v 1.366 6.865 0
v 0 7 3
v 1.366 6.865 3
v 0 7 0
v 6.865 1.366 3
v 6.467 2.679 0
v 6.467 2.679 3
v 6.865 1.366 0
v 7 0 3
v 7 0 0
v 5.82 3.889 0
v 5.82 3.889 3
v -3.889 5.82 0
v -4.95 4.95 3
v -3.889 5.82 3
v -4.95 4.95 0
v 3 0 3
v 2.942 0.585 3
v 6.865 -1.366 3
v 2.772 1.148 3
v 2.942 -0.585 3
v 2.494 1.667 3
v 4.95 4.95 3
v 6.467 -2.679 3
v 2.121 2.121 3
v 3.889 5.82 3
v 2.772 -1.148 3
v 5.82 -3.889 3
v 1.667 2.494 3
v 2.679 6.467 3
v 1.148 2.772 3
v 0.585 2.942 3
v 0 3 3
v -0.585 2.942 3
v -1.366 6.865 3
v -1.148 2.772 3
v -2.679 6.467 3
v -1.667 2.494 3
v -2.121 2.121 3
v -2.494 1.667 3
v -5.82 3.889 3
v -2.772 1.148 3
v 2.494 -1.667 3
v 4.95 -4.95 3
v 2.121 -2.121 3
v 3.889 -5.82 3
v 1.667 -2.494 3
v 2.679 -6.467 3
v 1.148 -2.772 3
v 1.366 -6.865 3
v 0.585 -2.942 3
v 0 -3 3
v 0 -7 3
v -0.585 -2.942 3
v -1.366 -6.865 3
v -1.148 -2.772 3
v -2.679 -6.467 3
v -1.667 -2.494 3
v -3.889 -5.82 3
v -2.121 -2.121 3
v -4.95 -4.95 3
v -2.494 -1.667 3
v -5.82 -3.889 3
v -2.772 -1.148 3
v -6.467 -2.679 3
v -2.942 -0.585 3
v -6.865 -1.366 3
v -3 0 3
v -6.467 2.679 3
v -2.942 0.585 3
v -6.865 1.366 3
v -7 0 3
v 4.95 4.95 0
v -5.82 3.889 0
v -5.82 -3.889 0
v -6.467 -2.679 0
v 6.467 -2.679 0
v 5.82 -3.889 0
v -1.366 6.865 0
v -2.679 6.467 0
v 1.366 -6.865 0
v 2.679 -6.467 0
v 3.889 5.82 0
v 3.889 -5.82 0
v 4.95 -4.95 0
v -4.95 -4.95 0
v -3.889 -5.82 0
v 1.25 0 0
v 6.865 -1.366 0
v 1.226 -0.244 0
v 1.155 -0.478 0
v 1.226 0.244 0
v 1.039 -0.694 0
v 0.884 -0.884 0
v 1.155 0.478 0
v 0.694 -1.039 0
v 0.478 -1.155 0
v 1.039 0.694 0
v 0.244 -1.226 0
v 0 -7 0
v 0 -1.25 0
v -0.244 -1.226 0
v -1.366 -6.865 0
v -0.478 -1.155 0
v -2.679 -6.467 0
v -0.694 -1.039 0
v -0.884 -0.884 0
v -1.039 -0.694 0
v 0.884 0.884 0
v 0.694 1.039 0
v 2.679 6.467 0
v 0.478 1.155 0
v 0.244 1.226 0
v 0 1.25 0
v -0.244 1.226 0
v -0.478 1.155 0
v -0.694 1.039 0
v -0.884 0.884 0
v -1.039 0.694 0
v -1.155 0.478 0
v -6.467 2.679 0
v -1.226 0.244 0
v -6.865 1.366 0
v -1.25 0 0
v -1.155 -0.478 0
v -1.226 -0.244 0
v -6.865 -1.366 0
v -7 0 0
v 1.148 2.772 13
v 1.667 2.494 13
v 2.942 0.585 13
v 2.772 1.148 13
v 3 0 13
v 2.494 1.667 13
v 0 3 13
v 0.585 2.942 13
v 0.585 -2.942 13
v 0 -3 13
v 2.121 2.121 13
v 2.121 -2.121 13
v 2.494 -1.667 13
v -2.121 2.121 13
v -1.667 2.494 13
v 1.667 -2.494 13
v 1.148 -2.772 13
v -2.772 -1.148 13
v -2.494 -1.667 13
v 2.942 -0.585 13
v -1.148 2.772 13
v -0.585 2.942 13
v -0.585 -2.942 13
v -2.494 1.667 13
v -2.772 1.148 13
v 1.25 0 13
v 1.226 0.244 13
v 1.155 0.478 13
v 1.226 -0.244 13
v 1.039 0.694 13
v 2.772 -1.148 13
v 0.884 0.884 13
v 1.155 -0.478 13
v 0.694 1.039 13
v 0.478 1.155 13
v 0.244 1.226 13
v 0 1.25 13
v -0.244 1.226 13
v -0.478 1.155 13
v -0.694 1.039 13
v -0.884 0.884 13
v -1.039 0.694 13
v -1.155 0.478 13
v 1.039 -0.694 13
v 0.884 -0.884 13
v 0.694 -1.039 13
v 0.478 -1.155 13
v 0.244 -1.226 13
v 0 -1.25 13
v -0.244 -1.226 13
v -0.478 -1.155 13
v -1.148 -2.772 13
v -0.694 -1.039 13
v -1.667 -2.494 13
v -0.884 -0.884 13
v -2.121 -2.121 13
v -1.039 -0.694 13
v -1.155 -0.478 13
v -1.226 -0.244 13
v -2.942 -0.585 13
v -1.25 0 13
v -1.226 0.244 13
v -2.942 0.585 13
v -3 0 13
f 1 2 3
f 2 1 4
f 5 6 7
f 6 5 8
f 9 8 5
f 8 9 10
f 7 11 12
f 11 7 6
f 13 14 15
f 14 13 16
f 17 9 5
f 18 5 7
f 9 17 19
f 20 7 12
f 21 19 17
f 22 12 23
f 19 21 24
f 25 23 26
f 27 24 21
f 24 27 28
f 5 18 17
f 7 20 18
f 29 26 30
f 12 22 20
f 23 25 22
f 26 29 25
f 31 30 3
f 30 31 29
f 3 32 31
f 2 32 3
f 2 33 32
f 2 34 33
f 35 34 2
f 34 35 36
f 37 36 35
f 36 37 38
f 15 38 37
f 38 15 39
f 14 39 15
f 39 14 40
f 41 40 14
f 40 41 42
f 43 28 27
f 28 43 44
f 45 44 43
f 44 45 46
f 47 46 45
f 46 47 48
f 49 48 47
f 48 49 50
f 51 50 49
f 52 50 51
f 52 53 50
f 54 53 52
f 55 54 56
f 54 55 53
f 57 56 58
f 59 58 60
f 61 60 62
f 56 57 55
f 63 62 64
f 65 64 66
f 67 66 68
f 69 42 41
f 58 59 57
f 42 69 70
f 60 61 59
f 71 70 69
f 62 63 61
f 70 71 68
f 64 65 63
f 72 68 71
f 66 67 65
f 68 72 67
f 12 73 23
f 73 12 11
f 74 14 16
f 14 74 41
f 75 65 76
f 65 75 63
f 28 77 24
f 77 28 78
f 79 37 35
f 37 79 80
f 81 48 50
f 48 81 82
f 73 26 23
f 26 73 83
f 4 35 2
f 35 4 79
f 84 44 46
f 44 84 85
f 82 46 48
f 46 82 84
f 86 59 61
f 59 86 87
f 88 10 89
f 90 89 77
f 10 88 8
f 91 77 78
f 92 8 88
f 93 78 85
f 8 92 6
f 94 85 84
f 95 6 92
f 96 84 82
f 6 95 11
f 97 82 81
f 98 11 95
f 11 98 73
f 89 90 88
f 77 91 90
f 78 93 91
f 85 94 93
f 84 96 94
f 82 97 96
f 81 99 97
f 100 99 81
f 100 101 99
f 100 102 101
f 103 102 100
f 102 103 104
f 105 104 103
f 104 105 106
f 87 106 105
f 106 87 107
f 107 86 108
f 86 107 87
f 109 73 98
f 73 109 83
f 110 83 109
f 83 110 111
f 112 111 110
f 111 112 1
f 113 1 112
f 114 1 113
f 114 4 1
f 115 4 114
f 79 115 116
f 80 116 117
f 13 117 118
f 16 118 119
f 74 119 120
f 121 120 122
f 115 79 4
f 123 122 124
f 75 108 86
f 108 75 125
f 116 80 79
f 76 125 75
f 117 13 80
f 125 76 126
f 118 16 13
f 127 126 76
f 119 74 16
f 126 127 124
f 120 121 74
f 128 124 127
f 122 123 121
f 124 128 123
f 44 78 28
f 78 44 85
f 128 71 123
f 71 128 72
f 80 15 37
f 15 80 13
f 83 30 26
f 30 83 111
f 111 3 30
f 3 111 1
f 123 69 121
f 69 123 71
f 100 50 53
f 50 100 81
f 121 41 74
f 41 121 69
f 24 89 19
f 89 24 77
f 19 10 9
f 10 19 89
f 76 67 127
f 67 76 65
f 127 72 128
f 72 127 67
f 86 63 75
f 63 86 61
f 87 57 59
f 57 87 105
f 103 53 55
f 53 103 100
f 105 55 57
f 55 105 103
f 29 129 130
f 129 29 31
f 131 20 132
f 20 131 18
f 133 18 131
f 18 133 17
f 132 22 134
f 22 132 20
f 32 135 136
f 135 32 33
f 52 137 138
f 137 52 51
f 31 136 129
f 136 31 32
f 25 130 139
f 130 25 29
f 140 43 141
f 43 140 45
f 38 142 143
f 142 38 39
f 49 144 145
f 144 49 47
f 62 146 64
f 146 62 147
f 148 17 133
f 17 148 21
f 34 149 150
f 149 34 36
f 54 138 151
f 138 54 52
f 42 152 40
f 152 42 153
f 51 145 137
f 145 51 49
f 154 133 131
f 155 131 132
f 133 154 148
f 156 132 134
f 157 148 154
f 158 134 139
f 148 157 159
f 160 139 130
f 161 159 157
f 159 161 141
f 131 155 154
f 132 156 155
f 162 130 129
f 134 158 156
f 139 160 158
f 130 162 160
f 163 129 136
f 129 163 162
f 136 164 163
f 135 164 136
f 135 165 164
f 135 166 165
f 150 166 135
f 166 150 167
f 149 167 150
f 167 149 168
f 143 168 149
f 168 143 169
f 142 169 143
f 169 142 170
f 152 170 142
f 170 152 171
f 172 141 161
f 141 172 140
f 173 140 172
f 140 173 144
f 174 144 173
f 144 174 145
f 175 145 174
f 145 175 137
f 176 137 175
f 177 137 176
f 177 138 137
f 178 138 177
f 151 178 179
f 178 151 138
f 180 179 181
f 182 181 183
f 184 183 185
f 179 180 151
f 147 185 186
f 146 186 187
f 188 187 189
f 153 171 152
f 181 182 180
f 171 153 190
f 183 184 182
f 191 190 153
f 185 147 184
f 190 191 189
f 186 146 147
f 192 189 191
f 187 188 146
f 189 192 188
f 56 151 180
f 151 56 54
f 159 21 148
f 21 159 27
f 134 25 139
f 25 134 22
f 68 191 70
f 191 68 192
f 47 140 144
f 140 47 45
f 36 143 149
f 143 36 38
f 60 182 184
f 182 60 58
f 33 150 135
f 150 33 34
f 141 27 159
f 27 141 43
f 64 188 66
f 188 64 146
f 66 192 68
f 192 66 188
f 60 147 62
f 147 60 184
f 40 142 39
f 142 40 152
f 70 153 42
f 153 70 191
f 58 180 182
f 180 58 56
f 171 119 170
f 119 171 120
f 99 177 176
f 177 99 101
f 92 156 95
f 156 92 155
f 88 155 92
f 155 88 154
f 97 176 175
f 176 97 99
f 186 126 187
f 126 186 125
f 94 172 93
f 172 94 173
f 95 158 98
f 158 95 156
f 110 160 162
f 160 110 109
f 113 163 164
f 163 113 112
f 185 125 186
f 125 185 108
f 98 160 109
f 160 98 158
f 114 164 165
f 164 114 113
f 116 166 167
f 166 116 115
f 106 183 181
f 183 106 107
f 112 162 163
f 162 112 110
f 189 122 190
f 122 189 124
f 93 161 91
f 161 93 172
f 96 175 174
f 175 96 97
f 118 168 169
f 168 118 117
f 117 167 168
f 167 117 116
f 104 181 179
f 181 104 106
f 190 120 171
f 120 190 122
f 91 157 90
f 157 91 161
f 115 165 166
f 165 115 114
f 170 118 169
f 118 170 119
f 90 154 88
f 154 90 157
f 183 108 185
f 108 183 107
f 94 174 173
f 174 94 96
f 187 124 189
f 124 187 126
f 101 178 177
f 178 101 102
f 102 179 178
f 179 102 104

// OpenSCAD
$fn = 32;

// ----------------------------------------------------------------------
// Micro post: flanged post, 5-20 mm class
// ----------------------------------------------------------------------

// --- parameters (mm) ---
post_d = 6;               // post diameter
post_h = 10;              // post height above the flange
flange_d = 14;            // flange diameter
flange_t = 3;             // flange thickness
bore_d = 2.5;             // through bore

total_h = post_h + flange_t;  // overall height

difference() {
  union() {
    cylinder(h = flange_t, d = flange_d);
    translate([0, 0, flange_t]) cylinder(h = post_h, d = post_d);
  }
  translate([0, 0, -1]) cylinder(h = total_h + 2, d = bore_d);
}
